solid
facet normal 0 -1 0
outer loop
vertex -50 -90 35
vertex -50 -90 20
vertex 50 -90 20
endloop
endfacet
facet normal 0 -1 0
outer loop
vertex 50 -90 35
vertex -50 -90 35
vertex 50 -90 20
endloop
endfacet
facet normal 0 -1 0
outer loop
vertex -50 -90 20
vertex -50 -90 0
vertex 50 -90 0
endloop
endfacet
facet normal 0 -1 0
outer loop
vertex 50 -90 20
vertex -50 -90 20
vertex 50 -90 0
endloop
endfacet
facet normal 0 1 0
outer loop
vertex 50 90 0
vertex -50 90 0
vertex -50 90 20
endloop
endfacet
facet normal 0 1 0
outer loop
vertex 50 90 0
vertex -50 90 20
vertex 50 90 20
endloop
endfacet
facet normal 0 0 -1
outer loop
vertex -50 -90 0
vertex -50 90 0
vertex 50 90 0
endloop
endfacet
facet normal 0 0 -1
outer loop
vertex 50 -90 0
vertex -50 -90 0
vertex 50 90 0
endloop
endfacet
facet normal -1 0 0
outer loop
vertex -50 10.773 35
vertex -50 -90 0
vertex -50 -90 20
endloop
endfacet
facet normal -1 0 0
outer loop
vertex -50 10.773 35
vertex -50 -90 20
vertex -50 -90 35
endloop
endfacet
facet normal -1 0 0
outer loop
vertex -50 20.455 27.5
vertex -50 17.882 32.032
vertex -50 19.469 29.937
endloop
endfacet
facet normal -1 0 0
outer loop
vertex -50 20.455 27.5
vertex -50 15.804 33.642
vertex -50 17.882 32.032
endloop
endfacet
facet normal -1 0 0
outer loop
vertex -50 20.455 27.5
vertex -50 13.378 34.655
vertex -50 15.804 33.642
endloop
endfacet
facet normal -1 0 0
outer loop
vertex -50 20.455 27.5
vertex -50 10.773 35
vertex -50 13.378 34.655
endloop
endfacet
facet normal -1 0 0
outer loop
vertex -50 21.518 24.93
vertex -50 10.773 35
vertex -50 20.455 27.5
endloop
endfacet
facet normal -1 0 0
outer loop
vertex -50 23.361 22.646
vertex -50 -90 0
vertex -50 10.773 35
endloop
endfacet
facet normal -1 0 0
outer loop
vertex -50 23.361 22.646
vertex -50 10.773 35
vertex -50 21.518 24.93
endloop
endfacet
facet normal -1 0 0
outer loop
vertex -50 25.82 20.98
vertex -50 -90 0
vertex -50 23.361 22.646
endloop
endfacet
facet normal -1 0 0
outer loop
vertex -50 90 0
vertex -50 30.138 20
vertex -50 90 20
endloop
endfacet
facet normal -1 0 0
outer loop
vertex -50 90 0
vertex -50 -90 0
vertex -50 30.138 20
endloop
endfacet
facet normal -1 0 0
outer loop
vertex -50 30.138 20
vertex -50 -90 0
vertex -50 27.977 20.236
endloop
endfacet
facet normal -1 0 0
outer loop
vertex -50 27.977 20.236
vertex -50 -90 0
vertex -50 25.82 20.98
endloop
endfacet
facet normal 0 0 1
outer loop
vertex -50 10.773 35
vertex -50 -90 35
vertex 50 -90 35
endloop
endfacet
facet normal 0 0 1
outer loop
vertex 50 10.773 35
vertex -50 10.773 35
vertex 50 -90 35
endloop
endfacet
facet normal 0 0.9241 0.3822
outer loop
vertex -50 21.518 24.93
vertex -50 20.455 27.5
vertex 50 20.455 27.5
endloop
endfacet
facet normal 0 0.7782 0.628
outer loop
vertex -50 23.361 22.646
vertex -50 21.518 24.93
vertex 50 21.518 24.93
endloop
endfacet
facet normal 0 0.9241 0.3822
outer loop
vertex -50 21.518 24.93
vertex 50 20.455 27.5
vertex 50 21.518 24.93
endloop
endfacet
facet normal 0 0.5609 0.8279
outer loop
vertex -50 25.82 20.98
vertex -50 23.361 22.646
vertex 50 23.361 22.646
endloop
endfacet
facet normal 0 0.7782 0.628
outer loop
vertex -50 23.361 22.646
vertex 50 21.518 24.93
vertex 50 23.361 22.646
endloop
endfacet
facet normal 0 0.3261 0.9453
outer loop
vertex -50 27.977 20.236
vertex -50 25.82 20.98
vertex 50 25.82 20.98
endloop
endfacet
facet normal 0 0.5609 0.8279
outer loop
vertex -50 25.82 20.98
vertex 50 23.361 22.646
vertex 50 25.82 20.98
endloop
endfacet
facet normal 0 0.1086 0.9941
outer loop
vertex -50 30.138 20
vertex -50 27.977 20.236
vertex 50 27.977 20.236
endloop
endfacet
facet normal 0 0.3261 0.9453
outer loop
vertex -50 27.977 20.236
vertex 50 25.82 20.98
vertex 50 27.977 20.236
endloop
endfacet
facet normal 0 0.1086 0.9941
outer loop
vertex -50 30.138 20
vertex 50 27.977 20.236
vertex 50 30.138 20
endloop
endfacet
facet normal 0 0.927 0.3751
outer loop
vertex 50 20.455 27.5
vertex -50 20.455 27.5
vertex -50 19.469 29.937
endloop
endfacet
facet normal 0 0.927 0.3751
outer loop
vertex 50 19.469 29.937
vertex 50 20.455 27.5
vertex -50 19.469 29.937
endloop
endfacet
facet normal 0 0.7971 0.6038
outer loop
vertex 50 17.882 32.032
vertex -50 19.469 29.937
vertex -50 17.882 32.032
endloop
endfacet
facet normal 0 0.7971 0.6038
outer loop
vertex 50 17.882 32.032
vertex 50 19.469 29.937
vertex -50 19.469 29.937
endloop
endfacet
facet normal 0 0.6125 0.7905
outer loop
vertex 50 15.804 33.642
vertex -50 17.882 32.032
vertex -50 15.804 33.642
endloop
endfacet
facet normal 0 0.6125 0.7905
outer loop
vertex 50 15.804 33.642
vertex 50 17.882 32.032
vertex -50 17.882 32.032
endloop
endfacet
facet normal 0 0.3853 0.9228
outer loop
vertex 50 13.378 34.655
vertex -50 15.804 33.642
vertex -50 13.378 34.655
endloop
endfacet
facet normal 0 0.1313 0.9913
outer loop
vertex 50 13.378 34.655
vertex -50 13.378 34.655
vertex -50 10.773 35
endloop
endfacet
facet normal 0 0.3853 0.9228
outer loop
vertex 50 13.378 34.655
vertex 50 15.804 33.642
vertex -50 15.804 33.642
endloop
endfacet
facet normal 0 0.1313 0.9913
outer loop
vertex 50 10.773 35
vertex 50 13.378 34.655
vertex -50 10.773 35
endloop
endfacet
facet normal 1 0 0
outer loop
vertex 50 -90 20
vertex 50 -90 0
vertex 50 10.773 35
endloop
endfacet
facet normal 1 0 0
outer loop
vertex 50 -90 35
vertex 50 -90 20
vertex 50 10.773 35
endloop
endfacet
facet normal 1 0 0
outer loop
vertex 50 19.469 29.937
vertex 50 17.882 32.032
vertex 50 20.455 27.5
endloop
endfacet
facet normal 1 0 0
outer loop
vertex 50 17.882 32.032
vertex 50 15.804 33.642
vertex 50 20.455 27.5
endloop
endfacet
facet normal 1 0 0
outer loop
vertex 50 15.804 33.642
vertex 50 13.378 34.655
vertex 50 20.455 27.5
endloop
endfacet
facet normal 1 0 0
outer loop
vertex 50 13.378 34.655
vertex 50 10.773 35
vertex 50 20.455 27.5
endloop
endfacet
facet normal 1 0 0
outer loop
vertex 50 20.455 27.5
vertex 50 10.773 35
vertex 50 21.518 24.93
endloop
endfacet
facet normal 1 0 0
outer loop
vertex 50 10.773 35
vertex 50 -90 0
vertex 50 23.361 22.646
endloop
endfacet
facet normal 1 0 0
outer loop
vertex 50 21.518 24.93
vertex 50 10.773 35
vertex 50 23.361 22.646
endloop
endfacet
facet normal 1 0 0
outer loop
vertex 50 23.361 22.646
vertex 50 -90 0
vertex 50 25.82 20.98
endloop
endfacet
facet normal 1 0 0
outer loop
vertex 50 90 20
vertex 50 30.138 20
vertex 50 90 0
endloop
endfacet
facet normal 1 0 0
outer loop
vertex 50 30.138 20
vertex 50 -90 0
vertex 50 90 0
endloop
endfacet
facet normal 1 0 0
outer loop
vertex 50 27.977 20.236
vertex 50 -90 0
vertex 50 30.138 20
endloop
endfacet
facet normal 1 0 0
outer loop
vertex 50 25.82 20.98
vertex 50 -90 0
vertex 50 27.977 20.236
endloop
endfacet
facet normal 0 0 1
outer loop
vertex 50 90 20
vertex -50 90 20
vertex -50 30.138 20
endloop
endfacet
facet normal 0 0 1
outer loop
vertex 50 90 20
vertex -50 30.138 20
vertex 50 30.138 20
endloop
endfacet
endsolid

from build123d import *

# Parameters (mm, degrees)
SKETCH_1_W      = 100
SKETCH_1_H      = 180
EXTRUDE_1_DEPTH = 20
SKETCH_2_W      = 100
SKETCH_2_H      = 110.772585851
EXTRUDE_2_DEPTH = 15
FILLET_1_R      = 10
FILLET_2_R      = 10


with BuildPart() as part:
    # 草图1 → 凸台-拉伸1 (new body)
    with BuildSketch(Plane.XY):
        Rectangle(SKETCH_1_W, SKETCH_1_H)
    extrude(amount=EXTRUDE_1_DEPTH)

    # 草图2 → 凸台-拉伸2 (add)
    with BuildSketch(Plane.XY.offset(20)):
        with Locations((0, -34.613707074)):
            Rectangle(SKETCH_2_W, SKETCH_2_H)
    extrude(amount=EXTRUDE_2_DEPTH)

    # 圆角1
    fillet_1_edges = [part.edges().sort_by_distance(p)[0] for p in [
        (0, 20.772585851, 35),
    ]]
    fillet(fillet_1_edges, radius=FILLET_1_R)

    # 圆角2
    fillet_2_edges = [part.edges().sort_by_distance(p)[0] for p in [
        (0, 20.772585851, 20),
    ]]
    fillet(fillet_2_edges, radius=FILLET_2_R)


solid = part.part
